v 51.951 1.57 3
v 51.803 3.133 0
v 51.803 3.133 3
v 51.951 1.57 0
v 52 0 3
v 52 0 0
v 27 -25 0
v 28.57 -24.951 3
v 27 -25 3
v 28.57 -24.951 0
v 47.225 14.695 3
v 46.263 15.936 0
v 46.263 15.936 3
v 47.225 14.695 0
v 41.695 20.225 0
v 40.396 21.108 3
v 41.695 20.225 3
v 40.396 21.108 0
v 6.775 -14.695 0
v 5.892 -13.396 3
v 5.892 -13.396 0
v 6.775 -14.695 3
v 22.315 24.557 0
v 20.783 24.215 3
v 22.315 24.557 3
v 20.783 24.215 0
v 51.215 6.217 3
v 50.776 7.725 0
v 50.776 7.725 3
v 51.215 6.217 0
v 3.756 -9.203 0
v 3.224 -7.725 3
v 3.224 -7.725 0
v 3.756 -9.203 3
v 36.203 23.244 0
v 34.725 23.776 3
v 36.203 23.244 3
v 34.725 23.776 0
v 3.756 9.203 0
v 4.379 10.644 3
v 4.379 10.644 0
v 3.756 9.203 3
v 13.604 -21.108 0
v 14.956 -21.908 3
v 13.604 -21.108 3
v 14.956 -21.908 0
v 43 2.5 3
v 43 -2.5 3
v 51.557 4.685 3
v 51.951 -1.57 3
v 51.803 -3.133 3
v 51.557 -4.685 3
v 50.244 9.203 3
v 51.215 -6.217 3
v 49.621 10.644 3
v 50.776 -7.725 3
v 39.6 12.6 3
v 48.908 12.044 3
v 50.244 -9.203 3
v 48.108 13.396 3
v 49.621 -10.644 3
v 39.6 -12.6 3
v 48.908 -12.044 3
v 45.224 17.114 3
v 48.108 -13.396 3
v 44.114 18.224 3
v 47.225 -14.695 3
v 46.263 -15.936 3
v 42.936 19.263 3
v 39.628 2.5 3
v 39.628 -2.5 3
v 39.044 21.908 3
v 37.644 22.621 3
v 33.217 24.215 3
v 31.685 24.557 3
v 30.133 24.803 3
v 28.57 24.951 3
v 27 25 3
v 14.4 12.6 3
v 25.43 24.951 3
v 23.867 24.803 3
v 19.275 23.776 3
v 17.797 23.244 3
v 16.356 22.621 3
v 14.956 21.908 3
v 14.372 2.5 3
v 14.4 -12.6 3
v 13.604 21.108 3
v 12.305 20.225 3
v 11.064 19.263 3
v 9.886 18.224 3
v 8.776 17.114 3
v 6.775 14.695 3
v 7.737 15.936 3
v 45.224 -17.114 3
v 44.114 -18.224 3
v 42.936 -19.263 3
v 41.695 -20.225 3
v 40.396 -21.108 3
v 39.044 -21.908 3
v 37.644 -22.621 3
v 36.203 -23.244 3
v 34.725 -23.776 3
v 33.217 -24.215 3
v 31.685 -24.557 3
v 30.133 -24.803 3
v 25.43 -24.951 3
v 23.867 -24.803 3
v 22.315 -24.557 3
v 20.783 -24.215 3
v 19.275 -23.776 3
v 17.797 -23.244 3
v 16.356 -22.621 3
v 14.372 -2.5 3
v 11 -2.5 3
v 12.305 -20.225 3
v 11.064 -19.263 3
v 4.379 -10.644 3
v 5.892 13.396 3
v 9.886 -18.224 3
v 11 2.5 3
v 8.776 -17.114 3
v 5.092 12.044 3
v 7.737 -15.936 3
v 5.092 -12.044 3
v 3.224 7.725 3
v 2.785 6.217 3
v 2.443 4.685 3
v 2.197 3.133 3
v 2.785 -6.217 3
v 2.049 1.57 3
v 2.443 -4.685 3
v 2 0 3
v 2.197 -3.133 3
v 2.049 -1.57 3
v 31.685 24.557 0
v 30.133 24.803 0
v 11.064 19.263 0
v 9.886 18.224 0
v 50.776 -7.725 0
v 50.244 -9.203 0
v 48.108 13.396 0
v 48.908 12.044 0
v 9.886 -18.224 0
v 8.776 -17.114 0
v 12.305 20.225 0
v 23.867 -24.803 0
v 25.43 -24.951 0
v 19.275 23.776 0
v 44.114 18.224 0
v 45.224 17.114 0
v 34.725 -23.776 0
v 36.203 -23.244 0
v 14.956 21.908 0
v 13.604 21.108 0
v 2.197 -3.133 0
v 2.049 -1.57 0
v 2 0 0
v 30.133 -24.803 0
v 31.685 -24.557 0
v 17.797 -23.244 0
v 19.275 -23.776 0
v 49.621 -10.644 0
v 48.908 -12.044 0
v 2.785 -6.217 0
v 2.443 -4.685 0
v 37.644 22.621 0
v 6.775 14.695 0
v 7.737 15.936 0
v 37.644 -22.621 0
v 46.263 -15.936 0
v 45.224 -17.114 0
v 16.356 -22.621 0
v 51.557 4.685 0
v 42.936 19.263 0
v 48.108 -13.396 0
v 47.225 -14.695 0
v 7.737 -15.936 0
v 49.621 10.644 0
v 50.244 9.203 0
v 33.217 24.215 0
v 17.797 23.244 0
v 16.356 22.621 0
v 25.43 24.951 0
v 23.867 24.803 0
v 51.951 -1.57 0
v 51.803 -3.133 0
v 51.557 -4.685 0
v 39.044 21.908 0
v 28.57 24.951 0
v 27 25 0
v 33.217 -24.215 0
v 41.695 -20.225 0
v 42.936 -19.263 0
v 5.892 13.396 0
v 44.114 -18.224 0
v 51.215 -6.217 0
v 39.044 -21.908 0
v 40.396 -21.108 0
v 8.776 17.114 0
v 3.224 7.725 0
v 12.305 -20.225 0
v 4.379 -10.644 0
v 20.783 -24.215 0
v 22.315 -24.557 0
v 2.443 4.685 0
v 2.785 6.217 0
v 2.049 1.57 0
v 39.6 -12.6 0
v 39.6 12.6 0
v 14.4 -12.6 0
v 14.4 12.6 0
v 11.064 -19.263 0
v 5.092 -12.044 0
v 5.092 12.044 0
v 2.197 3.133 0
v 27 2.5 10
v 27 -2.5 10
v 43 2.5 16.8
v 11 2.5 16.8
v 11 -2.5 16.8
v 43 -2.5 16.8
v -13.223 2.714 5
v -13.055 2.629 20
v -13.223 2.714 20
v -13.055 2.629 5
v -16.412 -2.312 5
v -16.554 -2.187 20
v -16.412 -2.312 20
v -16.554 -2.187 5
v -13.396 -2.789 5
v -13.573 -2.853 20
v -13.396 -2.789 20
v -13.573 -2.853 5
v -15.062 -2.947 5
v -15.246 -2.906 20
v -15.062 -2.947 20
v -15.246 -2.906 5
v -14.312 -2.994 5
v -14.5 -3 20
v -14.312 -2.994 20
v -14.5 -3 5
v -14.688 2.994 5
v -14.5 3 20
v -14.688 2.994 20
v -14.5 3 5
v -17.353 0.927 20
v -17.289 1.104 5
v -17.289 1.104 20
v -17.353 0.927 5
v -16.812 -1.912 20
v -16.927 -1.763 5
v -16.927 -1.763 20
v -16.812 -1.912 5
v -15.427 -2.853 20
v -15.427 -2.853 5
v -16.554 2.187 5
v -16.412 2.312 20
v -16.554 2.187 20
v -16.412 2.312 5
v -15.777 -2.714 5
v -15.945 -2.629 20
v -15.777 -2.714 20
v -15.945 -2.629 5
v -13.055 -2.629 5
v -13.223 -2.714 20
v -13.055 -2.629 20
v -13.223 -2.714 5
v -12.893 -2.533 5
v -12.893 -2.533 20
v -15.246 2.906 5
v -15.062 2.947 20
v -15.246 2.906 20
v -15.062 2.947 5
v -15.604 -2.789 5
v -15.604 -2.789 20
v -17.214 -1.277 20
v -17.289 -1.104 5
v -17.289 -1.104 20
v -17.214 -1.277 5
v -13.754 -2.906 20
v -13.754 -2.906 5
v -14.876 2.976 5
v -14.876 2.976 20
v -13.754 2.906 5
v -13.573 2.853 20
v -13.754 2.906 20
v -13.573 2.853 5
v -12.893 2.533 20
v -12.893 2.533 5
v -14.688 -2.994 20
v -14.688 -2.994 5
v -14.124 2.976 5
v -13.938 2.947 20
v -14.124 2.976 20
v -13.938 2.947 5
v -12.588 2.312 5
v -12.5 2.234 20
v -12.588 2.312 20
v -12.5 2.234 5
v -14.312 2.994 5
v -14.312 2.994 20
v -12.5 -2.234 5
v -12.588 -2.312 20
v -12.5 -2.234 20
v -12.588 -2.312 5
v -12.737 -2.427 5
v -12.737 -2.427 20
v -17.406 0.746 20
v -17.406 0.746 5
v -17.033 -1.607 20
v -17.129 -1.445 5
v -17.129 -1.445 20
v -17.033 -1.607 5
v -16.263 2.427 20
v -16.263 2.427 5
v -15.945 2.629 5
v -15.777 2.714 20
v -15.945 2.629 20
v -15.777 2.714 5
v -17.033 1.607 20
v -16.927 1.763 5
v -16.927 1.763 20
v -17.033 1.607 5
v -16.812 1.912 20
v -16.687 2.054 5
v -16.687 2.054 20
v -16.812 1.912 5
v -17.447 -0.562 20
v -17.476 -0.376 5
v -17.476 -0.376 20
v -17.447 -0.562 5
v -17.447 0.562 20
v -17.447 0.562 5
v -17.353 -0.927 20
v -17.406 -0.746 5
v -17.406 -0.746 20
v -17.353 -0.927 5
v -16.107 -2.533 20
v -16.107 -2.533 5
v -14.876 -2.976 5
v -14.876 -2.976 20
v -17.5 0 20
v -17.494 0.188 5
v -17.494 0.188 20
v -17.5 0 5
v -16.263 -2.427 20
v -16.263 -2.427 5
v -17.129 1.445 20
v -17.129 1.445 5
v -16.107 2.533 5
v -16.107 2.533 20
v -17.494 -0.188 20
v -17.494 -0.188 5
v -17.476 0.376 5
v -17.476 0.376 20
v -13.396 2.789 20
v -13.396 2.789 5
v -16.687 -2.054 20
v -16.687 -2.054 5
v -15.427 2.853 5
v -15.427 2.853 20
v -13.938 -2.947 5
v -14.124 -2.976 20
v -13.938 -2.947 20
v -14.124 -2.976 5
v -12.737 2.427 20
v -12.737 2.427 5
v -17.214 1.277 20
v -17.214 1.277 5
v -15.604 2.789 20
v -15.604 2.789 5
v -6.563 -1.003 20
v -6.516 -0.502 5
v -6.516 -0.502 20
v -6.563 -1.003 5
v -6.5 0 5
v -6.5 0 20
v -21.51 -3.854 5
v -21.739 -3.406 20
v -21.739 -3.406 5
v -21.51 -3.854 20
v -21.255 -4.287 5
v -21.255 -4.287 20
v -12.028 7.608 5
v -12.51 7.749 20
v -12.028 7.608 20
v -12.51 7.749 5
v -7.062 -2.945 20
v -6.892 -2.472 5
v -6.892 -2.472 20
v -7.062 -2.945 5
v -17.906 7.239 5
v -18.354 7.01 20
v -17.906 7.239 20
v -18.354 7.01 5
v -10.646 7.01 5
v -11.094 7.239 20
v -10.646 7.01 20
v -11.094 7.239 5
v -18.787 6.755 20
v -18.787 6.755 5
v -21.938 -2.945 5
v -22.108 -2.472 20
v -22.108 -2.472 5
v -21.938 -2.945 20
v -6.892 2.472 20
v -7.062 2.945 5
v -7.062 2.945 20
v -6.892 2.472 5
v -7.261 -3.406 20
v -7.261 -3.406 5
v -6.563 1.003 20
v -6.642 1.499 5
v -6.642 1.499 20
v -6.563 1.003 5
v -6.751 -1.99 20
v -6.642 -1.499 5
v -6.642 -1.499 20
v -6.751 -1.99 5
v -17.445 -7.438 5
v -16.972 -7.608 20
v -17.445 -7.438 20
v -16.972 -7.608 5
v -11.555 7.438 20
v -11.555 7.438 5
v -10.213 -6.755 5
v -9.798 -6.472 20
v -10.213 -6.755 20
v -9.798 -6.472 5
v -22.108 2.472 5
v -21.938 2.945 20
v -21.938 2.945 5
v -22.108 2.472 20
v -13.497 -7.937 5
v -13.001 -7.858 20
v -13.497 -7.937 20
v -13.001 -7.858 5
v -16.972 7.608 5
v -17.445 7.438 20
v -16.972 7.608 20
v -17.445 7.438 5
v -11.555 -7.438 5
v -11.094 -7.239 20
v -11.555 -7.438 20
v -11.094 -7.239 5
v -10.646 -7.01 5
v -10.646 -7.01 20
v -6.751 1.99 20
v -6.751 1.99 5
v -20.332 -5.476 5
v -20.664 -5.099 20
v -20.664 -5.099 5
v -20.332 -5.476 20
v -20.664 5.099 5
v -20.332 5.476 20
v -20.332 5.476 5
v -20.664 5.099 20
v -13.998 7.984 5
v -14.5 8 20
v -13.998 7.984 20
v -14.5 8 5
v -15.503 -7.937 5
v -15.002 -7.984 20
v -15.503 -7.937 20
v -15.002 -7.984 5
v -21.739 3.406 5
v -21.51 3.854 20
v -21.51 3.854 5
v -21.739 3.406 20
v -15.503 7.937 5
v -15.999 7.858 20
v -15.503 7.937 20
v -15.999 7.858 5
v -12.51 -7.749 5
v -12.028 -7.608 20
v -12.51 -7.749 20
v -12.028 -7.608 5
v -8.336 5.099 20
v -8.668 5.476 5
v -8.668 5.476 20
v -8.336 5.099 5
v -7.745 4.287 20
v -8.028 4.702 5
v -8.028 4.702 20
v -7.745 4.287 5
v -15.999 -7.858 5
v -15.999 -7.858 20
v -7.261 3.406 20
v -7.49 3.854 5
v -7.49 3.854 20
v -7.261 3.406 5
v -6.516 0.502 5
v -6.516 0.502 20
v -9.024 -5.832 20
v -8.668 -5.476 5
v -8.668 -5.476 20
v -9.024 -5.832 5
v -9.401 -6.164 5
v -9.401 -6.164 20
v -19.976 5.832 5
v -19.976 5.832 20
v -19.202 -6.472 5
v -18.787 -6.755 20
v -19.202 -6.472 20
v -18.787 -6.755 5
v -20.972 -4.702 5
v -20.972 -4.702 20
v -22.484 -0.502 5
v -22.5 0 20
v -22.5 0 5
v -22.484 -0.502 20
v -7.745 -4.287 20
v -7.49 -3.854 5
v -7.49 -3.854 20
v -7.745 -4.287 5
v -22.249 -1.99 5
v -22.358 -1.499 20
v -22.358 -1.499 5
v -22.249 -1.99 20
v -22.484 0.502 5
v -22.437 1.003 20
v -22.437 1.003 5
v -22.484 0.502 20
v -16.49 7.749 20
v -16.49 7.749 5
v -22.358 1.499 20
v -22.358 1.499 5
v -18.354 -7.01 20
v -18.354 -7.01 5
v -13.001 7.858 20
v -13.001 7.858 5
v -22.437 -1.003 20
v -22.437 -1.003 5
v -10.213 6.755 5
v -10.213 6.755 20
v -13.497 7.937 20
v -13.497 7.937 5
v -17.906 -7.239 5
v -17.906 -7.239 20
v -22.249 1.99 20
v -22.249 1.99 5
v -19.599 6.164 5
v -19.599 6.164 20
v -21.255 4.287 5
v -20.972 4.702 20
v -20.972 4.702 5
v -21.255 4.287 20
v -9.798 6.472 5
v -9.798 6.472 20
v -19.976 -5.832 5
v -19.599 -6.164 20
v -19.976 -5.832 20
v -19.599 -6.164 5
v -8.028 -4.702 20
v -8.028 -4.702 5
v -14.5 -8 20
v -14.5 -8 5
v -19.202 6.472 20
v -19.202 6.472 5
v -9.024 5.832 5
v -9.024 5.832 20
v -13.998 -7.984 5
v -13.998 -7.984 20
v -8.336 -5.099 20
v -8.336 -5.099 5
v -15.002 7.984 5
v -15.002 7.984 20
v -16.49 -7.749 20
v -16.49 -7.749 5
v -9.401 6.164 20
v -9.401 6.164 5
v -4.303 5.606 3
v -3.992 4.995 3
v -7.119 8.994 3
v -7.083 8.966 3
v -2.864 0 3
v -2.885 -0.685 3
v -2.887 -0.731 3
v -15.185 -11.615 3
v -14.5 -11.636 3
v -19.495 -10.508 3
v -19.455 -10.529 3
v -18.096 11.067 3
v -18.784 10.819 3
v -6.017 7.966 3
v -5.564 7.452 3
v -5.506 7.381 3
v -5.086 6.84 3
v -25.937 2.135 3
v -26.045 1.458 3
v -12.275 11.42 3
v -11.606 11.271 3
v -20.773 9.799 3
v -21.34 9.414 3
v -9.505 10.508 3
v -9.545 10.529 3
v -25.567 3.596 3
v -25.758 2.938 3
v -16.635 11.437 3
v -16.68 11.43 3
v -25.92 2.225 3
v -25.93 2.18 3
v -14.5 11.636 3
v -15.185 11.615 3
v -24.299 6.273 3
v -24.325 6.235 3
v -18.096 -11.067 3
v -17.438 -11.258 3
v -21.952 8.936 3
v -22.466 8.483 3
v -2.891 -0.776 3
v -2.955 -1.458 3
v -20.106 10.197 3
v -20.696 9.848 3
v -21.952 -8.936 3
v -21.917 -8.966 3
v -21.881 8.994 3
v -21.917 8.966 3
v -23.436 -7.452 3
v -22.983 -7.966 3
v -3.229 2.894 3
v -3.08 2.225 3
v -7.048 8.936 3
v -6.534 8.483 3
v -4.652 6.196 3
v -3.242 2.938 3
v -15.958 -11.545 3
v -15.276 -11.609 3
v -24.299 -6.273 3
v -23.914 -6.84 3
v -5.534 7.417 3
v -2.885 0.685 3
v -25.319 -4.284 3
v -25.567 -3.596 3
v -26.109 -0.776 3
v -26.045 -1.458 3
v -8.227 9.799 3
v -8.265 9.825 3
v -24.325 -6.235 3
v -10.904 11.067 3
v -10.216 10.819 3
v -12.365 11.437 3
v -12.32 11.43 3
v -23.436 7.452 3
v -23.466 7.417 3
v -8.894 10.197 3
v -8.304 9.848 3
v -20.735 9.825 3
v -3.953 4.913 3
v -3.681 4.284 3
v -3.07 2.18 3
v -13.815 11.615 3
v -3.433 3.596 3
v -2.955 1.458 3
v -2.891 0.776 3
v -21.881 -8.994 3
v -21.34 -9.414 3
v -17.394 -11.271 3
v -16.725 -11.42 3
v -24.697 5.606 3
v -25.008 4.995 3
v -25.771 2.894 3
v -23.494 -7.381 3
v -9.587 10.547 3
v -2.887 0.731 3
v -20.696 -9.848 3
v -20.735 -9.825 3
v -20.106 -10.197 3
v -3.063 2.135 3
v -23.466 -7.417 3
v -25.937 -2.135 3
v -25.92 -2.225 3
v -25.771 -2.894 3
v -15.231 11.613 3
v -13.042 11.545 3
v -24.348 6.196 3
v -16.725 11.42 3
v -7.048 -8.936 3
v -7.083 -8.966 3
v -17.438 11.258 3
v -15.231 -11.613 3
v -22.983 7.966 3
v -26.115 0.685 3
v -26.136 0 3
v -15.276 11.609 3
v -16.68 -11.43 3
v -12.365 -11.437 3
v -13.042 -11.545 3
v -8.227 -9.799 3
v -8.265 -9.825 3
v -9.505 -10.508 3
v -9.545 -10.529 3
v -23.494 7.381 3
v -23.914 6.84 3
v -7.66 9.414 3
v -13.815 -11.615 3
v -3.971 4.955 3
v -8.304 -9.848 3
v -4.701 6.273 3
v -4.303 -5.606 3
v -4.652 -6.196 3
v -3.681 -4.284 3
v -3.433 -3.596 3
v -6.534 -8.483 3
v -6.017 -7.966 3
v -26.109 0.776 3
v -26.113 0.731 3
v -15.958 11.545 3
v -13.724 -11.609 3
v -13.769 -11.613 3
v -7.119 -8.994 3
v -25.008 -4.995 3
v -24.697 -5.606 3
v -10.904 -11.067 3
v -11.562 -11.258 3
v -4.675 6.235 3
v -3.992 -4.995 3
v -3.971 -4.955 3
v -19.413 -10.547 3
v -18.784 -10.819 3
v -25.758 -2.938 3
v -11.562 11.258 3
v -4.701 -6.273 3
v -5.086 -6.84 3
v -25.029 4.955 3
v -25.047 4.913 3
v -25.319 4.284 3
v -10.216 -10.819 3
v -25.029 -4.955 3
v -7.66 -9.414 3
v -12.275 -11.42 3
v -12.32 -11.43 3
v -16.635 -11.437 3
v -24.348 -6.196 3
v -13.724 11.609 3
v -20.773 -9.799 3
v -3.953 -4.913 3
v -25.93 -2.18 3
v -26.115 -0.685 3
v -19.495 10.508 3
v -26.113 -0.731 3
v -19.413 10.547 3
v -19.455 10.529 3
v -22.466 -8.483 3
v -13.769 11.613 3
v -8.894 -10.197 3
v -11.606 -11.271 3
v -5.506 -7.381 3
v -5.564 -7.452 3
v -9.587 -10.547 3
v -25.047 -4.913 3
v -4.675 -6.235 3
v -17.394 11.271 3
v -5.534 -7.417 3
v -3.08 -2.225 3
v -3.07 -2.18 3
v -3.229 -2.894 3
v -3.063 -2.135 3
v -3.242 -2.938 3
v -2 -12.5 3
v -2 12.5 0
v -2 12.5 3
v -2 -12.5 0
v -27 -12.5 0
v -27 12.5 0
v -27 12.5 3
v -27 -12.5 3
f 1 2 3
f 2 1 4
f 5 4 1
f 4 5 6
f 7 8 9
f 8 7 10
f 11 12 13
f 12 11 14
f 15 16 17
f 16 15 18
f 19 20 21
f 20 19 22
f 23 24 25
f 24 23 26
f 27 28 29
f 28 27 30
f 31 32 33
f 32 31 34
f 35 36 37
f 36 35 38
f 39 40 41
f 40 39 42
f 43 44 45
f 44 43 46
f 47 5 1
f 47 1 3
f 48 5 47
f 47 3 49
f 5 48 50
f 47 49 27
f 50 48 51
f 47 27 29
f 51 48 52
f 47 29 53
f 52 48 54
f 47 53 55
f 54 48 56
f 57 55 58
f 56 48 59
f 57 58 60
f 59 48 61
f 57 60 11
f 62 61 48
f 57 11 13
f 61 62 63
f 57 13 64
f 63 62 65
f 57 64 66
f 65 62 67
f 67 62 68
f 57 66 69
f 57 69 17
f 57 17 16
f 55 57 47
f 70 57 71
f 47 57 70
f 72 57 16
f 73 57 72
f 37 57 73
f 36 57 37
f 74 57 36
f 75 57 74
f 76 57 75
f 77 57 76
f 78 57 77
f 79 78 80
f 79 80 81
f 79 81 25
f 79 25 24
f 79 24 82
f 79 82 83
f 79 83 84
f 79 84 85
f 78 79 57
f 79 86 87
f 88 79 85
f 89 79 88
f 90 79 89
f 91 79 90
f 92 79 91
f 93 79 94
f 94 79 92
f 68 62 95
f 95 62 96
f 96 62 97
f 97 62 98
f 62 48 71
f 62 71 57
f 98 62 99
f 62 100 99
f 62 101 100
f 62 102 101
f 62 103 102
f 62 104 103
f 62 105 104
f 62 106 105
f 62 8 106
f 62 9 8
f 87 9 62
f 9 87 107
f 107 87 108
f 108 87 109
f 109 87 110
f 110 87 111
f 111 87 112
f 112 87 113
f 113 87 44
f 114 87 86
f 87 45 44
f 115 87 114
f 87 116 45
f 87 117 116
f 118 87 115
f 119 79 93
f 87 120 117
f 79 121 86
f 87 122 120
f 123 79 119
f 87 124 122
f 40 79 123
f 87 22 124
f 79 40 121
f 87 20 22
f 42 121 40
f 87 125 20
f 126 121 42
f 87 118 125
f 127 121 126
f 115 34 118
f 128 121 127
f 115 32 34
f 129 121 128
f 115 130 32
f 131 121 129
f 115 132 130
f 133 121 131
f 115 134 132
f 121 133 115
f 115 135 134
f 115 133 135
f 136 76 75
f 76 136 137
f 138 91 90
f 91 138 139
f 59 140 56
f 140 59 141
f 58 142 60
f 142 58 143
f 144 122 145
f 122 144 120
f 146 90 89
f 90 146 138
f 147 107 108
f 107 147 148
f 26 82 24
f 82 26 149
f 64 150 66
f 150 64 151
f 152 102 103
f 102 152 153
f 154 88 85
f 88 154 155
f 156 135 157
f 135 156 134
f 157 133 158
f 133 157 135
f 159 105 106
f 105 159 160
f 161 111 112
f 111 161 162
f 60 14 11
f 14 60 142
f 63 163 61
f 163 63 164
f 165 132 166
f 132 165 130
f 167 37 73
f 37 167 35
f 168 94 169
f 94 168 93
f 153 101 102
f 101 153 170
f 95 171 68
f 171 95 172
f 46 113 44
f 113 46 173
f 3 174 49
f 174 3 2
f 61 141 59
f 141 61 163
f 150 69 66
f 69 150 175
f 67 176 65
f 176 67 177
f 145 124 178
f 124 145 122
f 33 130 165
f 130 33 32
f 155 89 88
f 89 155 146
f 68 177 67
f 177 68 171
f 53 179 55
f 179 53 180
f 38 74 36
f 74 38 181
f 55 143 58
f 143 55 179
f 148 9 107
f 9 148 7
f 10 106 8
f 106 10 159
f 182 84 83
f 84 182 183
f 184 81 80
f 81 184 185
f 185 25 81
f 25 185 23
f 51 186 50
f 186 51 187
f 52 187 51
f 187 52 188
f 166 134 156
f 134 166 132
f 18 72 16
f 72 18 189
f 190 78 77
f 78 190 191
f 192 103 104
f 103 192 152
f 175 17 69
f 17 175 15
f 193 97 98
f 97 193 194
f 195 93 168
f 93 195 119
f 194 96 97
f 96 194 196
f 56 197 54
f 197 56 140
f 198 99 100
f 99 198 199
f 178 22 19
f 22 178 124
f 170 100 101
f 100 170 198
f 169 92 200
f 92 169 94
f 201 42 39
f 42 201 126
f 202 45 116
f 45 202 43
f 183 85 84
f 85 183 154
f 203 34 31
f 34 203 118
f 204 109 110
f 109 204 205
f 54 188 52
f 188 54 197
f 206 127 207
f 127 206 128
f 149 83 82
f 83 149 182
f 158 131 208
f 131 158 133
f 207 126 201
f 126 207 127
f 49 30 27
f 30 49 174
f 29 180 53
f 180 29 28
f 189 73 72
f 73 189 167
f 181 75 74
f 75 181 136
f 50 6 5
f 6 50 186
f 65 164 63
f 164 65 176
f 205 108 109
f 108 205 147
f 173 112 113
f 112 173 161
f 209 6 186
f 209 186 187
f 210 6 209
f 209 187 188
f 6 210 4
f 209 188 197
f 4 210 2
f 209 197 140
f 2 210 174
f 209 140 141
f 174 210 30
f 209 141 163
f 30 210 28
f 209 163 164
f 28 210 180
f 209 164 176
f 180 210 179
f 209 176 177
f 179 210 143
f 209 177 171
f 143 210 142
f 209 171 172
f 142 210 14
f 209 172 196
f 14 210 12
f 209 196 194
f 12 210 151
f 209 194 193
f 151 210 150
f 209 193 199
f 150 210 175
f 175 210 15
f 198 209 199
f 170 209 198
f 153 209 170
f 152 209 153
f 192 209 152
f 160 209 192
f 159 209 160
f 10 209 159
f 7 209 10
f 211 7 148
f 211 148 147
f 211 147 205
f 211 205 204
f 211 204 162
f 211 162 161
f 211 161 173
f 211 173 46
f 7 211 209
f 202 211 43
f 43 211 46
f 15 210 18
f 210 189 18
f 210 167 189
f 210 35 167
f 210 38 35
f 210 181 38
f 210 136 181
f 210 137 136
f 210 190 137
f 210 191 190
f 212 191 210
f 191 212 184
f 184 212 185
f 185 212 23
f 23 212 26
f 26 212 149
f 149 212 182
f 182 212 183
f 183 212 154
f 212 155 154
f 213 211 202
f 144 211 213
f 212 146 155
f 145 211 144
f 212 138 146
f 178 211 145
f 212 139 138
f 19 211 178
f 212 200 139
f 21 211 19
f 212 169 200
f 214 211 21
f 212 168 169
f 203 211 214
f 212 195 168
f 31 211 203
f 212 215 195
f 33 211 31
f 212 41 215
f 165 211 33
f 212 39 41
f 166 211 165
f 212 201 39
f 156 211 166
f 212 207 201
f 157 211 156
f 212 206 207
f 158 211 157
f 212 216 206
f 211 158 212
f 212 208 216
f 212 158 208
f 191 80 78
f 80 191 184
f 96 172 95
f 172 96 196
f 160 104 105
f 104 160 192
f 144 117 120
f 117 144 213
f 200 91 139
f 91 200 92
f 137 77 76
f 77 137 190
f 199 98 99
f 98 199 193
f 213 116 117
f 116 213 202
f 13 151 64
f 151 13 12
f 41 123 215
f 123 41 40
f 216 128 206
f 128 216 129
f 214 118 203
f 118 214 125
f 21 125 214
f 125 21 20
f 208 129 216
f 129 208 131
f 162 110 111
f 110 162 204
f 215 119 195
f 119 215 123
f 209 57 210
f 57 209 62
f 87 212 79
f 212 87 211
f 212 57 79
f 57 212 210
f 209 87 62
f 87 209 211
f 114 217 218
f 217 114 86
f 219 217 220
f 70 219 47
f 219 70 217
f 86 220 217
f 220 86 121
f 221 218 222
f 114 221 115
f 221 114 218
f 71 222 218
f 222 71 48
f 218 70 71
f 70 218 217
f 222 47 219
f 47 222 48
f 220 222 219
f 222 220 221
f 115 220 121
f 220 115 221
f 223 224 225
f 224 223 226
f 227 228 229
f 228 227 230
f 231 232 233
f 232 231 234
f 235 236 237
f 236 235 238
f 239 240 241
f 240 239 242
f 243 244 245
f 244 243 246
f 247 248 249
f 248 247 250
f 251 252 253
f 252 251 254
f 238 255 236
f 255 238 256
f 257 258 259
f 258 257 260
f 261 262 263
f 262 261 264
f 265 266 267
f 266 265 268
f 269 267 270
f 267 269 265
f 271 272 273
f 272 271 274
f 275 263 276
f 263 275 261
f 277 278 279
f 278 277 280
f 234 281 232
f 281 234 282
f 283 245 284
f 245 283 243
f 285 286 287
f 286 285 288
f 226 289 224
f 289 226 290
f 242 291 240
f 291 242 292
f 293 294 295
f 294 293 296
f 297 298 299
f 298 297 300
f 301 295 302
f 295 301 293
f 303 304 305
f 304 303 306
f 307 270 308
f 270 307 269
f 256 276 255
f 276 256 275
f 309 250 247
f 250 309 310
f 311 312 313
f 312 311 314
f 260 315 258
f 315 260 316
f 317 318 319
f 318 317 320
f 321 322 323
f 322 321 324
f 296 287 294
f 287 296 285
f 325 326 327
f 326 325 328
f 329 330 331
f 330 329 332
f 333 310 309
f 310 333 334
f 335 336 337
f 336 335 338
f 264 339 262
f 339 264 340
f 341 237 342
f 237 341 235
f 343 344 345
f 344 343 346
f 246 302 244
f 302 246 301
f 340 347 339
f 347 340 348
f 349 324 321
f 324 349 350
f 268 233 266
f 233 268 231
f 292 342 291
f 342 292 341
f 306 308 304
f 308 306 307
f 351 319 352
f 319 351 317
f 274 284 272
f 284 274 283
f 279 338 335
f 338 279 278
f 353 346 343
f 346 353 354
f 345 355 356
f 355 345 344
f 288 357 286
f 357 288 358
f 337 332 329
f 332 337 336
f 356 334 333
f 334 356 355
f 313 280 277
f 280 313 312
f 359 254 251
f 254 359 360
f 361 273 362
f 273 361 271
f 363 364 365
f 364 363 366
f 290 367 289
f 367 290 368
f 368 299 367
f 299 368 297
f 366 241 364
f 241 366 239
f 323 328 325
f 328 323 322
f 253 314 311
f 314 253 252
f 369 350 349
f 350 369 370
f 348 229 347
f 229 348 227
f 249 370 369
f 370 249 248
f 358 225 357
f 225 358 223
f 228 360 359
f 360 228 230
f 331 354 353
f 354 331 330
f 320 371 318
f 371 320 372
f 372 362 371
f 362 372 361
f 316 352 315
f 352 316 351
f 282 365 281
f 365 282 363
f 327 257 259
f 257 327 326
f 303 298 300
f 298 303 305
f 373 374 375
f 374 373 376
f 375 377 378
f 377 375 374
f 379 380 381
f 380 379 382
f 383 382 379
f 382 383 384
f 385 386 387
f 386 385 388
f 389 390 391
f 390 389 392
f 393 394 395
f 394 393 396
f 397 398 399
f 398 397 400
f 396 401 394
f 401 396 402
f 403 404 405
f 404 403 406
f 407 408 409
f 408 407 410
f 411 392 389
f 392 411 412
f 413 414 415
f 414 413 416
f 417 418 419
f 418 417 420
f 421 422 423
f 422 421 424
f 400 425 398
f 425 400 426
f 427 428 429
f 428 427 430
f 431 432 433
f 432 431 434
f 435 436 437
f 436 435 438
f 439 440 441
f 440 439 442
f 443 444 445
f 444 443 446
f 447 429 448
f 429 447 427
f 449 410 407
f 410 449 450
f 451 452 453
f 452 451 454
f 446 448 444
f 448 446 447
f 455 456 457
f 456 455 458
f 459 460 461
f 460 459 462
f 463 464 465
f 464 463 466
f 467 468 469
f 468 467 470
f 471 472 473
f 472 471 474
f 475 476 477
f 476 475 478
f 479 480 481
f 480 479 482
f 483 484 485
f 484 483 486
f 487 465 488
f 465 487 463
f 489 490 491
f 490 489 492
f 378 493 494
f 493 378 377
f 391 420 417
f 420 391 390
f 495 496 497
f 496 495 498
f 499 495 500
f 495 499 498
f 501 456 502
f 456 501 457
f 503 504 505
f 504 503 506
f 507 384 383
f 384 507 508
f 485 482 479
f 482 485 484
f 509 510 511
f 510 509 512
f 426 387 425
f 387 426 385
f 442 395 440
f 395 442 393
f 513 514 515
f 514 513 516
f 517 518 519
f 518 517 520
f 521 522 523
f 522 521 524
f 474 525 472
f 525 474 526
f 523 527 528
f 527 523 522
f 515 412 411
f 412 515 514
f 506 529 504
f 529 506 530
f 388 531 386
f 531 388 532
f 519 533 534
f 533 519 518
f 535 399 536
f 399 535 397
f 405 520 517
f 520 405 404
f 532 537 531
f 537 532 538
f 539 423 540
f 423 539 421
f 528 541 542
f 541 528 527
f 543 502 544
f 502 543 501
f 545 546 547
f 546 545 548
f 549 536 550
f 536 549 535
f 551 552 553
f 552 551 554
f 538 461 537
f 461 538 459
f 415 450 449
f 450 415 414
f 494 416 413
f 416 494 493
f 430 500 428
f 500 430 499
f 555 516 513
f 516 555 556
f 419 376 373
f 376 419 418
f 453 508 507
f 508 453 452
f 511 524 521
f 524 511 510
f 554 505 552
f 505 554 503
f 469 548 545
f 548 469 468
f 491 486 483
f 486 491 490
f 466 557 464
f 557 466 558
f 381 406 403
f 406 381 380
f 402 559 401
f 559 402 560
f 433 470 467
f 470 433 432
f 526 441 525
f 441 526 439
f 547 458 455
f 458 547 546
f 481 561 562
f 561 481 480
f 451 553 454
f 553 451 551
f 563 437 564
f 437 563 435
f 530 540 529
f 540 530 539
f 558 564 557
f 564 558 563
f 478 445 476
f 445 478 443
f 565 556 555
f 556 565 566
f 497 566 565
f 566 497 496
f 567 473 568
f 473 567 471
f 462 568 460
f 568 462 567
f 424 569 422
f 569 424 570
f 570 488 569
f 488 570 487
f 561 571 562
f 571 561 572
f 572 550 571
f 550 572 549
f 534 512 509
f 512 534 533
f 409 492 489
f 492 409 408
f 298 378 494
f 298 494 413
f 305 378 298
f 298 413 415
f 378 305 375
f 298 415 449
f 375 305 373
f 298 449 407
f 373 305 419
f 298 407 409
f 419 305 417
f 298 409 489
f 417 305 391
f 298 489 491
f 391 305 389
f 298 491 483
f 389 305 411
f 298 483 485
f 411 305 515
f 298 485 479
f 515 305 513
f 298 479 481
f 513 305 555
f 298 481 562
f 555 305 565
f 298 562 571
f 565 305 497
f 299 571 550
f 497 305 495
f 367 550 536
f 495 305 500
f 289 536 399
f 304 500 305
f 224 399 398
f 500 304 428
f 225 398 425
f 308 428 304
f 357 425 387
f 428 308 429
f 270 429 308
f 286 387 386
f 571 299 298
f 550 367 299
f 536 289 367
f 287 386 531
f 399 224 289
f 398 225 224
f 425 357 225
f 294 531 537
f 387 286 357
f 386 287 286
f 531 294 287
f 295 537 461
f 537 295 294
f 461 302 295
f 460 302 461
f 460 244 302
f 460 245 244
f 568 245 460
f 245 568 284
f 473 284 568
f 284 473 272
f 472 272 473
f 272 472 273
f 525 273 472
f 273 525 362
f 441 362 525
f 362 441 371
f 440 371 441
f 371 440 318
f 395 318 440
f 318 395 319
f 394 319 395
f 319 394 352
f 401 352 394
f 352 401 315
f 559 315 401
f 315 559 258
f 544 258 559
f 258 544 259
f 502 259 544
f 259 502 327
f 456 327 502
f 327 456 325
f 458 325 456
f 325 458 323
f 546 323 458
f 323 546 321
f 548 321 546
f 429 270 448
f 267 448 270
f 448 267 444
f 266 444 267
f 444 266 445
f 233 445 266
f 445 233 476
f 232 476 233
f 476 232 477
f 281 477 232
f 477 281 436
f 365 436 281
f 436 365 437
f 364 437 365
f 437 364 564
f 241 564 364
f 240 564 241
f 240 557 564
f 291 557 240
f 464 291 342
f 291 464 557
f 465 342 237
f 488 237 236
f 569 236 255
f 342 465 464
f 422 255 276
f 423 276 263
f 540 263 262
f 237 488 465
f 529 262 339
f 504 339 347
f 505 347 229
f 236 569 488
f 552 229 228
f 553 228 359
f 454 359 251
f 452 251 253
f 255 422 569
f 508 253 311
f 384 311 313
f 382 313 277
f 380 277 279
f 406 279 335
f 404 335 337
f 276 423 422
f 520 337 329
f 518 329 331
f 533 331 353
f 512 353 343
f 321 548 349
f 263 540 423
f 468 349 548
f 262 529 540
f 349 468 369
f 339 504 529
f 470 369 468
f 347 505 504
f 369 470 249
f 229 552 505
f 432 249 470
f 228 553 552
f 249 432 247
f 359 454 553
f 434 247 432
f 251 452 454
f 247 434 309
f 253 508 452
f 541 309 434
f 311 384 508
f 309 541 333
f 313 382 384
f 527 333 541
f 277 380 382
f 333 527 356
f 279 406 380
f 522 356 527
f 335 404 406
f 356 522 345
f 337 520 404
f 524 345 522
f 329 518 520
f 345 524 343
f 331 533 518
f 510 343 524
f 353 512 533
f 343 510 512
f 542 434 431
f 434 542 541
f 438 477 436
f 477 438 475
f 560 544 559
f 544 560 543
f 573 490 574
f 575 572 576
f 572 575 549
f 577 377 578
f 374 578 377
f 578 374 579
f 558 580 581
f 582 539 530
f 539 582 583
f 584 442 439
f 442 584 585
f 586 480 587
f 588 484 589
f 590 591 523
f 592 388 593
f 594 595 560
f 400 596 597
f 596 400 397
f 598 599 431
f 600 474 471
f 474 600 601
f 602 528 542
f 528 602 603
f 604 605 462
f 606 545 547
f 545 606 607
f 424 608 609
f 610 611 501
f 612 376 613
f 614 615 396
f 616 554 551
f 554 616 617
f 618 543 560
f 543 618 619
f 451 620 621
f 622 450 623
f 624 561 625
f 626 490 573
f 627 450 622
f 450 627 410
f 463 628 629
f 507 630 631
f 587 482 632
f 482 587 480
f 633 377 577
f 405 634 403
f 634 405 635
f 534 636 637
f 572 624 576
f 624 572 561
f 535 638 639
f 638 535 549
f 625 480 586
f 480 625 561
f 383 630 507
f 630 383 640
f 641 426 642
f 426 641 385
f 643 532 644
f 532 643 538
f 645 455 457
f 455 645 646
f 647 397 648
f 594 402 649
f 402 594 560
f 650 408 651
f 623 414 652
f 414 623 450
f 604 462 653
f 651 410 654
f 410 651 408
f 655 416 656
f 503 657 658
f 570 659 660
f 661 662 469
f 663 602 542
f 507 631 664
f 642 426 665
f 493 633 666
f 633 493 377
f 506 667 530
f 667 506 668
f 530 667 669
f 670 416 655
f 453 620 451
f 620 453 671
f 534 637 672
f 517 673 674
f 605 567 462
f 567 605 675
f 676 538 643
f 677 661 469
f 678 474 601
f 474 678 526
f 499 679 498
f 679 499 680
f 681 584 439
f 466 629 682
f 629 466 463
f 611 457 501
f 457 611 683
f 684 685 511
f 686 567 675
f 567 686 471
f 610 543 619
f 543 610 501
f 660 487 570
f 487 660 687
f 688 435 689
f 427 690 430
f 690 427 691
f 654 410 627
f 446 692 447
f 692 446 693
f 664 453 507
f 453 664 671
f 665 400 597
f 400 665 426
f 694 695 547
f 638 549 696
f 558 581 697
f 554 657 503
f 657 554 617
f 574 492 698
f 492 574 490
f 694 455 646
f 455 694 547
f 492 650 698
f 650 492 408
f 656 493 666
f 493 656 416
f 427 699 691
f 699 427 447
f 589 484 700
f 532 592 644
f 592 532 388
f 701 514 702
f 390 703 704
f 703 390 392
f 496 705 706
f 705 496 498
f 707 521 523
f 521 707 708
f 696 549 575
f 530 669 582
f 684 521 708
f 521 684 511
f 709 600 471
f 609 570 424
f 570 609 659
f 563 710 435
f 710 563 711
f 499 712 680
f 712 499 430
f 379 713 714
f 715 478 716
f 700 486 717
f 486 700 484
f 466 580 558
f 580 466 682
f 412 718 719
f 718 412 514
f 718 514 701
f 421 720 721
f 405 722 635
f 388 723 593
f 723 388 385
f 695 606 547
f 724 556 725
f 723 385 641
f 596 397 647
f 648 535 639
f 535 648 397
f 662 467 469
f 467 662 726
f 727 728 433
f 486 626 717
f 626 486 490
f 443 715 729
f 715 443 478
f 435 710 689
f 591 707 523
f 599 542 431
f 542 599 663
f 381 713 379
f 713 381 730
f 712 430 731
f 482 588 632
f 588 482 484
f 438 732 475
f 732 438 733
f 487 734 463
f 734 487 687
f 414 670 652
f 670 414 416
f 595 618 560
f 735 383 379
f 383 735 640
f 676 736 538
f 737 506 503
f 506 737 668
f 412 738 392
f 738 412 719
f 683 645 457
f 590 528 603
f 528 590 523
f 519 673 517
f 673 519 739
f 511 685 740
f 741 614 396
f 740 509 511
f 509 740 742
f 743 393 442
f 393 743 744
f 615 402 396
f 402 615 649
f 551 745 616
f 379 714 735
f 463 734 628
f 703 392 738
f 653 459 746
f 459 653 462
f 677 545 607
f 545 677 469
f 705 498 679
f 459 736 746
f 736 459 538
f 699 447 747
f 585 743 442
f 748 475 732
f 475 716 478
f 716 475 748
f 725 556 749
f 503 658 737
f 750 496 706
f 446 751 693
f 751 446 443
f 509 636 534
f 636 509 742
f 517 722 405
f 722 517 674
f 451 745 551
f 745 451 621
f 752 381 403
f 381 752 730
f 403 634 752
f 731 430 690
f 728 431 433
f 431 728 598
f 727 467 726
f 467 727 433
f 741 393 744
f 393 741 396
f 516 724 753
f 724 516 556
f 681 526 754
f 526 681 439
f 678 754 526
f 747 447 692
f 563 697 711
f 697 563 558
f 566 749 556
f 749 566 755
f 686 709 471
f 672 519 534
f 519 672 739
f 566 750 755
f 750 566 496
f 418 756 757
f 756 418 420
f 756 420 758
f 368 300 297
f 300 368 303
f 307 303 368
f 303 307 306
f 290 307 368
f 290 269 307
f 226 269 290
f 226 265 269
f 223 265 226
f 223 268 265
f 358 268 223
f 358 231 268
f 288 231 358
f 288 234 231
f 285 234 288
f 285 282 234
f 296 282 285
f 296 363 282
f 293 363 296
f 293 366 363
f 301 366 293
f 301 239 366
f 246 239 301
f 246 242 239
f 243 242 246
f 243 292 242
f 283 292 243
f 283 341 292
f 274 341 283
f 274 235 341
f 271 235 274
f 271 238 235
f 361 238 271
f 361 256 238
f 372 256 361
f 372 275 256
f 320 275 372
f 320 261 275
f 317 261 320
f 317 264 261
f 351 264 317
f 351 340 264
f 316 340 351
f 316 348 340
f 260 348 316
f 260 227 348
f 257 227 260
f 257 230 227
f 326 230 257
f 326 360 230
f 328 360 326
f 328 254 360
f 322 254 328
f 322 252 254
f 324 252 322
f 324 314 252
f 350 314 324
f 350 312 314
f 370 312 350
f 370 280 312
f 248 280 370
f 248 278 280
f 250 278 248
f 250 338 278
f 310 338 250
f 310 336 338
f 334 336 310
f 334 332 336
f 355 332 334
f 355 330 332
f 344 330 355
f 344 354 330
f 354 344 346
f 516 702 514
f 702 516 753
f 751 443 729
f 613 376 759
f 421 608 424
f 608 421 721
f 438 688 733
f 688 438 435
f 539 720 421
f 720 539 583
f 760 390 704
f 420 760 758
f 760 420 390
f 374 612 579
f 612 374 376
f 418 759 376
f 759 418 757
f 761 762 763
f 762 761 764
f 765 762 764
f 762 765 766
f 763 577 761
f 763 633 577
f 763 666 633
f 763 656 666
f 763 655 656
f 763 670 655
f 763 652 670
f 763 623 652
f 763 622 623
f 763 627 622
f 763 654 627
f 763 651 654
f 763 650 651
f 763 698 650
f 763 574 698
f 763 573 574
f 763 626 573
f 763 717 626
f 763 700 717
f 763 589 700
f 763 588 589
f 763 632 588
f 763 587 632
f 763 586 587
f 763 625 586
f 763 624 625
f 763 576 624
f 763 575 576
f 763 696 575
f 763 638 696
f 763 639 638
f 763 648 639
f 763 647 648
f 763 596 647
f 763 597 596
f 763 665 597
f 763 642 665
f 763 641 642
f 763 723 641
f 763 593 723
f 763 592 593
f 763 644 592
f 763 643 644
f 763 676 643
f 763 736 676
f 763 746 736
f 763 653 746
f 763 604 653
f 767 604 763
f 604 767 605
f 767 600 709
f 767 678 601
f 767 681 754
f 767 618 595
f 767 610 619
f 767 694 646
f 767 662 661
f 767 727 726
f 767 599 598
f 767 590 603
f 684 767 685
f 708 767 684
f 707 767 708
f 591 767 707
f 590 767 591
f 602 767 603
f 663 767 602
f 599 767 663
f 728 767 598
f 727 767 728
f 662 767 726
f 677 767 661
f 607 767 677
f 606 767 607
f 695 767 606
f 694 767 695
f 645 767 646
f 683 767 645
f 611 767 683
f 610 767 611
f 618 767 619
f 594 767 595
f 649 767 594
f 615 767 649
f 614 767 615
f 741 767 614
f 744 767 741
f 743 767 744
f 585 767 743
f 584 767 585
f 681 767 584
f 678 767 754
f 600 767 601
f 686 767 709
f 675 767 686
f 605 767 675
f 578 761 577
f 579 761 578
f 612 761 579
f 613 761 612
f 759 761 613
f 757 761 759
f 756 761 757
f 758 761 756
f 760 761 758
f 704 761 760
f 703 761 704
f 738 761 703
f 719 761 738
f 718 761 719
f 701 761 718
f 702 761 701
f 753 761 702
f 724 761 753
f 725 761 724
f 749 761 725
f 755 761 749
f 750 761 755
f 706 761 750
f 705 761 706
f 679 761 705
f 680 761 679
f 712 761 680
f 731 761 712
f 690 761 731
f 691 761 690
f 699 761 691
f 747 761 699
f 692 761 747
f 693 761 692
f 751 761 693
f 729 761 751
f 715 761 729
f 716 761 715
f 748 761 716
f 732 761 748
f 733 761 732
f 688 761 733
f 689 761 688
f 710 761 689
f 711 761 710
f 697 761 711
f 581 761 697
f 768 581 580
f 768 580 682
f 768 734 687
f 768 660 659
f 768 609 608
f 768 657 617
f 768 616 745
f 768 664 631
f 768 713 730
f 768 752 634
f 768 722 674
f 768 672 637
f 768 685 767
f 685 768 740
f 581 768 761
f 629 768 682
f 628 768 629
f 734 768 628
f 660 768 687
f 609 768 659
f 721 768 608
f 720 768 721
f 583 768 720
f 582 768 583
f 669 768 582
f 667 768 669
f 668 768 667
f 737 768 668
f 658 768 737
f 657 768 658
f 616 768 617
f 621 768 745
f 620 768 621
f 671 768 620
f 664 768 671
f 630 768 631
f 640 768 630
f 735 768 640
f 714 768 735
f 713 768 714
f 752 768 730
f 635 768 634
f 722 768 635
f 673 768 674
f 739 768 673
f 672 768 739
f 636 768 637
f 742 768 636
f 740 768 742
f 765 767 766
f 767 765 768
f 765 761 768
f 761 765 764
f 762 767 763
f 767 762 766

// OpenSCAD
disc_r = 25;
disc_t = 3;

dial_r = 16;
dial_t = 5;
dial_h = 14;

post_h = 17;
post_r = 8;

ring_r = 12;
ring_h = 2;

hole_r = 3;
hole_f = 2;

cutout_offset = 10;
cutout_angle = 29;

square_w = 25;

$fn = 100;
eps = 0.2;

module top() {
    difference() {
        cylinder(r = 25, h = 3);
        translate([-(square_w+eps)/2, -(square_w+eps)/2, -eps])
            cube([square_w+eps, square_w+eps, disc_t+2*eps]);
    }

    intersection() {
        translate([-dial_r, -dial_t/2, disc_t-eps])
            cube([2*dial_r, dial_t, dial_h]);
        translate([0, 0, cutout_offset]) union() {
            rotate([0, -cutout_angle, 0]) translate([-2*dial_r, -dial_t/2, 0])
                cube([4*dial_r, dial_t, dial_h]);
            rotate([0, +cutout_angle, 0]) translate([-2*dial_r, -dial_t/2, 0])
                cube([4*dial_r, dial_t, dial_h]);
            
        }
    }
}

module bottom() {
    difference() {
        cylinder(r = post_r, h = post_h+eps);
        translate([0, 0, -eps]) {
            difference() {
                cylinder(r = hole_r, h = post_h+eps);
                translate([hole_f, -hole_r, -eps])
                    cube([hole_r, 2*hole_r, post_h+3*eps]);
            }
        }
    }

    translate([0, 0, post_h-ring_h])
        cylinder(r1 = post_r, r2 = ring_r, h = ring_h+eps);
    
    translate([-square_w/2, -square_w/2, post_h])
        cube([square_w, square_w, disc_t]);
}

module knob() {
    top();
    translate([0, 0, -post_h])
        bottom();
}

module parts() {
    translate([disc_r+2, 0, 0]) top();
    translate([-square_w/2-2, 0, post_h+disc_t]) rotate([180, 0, 0]) bottom();
}

// knob();
parts();
